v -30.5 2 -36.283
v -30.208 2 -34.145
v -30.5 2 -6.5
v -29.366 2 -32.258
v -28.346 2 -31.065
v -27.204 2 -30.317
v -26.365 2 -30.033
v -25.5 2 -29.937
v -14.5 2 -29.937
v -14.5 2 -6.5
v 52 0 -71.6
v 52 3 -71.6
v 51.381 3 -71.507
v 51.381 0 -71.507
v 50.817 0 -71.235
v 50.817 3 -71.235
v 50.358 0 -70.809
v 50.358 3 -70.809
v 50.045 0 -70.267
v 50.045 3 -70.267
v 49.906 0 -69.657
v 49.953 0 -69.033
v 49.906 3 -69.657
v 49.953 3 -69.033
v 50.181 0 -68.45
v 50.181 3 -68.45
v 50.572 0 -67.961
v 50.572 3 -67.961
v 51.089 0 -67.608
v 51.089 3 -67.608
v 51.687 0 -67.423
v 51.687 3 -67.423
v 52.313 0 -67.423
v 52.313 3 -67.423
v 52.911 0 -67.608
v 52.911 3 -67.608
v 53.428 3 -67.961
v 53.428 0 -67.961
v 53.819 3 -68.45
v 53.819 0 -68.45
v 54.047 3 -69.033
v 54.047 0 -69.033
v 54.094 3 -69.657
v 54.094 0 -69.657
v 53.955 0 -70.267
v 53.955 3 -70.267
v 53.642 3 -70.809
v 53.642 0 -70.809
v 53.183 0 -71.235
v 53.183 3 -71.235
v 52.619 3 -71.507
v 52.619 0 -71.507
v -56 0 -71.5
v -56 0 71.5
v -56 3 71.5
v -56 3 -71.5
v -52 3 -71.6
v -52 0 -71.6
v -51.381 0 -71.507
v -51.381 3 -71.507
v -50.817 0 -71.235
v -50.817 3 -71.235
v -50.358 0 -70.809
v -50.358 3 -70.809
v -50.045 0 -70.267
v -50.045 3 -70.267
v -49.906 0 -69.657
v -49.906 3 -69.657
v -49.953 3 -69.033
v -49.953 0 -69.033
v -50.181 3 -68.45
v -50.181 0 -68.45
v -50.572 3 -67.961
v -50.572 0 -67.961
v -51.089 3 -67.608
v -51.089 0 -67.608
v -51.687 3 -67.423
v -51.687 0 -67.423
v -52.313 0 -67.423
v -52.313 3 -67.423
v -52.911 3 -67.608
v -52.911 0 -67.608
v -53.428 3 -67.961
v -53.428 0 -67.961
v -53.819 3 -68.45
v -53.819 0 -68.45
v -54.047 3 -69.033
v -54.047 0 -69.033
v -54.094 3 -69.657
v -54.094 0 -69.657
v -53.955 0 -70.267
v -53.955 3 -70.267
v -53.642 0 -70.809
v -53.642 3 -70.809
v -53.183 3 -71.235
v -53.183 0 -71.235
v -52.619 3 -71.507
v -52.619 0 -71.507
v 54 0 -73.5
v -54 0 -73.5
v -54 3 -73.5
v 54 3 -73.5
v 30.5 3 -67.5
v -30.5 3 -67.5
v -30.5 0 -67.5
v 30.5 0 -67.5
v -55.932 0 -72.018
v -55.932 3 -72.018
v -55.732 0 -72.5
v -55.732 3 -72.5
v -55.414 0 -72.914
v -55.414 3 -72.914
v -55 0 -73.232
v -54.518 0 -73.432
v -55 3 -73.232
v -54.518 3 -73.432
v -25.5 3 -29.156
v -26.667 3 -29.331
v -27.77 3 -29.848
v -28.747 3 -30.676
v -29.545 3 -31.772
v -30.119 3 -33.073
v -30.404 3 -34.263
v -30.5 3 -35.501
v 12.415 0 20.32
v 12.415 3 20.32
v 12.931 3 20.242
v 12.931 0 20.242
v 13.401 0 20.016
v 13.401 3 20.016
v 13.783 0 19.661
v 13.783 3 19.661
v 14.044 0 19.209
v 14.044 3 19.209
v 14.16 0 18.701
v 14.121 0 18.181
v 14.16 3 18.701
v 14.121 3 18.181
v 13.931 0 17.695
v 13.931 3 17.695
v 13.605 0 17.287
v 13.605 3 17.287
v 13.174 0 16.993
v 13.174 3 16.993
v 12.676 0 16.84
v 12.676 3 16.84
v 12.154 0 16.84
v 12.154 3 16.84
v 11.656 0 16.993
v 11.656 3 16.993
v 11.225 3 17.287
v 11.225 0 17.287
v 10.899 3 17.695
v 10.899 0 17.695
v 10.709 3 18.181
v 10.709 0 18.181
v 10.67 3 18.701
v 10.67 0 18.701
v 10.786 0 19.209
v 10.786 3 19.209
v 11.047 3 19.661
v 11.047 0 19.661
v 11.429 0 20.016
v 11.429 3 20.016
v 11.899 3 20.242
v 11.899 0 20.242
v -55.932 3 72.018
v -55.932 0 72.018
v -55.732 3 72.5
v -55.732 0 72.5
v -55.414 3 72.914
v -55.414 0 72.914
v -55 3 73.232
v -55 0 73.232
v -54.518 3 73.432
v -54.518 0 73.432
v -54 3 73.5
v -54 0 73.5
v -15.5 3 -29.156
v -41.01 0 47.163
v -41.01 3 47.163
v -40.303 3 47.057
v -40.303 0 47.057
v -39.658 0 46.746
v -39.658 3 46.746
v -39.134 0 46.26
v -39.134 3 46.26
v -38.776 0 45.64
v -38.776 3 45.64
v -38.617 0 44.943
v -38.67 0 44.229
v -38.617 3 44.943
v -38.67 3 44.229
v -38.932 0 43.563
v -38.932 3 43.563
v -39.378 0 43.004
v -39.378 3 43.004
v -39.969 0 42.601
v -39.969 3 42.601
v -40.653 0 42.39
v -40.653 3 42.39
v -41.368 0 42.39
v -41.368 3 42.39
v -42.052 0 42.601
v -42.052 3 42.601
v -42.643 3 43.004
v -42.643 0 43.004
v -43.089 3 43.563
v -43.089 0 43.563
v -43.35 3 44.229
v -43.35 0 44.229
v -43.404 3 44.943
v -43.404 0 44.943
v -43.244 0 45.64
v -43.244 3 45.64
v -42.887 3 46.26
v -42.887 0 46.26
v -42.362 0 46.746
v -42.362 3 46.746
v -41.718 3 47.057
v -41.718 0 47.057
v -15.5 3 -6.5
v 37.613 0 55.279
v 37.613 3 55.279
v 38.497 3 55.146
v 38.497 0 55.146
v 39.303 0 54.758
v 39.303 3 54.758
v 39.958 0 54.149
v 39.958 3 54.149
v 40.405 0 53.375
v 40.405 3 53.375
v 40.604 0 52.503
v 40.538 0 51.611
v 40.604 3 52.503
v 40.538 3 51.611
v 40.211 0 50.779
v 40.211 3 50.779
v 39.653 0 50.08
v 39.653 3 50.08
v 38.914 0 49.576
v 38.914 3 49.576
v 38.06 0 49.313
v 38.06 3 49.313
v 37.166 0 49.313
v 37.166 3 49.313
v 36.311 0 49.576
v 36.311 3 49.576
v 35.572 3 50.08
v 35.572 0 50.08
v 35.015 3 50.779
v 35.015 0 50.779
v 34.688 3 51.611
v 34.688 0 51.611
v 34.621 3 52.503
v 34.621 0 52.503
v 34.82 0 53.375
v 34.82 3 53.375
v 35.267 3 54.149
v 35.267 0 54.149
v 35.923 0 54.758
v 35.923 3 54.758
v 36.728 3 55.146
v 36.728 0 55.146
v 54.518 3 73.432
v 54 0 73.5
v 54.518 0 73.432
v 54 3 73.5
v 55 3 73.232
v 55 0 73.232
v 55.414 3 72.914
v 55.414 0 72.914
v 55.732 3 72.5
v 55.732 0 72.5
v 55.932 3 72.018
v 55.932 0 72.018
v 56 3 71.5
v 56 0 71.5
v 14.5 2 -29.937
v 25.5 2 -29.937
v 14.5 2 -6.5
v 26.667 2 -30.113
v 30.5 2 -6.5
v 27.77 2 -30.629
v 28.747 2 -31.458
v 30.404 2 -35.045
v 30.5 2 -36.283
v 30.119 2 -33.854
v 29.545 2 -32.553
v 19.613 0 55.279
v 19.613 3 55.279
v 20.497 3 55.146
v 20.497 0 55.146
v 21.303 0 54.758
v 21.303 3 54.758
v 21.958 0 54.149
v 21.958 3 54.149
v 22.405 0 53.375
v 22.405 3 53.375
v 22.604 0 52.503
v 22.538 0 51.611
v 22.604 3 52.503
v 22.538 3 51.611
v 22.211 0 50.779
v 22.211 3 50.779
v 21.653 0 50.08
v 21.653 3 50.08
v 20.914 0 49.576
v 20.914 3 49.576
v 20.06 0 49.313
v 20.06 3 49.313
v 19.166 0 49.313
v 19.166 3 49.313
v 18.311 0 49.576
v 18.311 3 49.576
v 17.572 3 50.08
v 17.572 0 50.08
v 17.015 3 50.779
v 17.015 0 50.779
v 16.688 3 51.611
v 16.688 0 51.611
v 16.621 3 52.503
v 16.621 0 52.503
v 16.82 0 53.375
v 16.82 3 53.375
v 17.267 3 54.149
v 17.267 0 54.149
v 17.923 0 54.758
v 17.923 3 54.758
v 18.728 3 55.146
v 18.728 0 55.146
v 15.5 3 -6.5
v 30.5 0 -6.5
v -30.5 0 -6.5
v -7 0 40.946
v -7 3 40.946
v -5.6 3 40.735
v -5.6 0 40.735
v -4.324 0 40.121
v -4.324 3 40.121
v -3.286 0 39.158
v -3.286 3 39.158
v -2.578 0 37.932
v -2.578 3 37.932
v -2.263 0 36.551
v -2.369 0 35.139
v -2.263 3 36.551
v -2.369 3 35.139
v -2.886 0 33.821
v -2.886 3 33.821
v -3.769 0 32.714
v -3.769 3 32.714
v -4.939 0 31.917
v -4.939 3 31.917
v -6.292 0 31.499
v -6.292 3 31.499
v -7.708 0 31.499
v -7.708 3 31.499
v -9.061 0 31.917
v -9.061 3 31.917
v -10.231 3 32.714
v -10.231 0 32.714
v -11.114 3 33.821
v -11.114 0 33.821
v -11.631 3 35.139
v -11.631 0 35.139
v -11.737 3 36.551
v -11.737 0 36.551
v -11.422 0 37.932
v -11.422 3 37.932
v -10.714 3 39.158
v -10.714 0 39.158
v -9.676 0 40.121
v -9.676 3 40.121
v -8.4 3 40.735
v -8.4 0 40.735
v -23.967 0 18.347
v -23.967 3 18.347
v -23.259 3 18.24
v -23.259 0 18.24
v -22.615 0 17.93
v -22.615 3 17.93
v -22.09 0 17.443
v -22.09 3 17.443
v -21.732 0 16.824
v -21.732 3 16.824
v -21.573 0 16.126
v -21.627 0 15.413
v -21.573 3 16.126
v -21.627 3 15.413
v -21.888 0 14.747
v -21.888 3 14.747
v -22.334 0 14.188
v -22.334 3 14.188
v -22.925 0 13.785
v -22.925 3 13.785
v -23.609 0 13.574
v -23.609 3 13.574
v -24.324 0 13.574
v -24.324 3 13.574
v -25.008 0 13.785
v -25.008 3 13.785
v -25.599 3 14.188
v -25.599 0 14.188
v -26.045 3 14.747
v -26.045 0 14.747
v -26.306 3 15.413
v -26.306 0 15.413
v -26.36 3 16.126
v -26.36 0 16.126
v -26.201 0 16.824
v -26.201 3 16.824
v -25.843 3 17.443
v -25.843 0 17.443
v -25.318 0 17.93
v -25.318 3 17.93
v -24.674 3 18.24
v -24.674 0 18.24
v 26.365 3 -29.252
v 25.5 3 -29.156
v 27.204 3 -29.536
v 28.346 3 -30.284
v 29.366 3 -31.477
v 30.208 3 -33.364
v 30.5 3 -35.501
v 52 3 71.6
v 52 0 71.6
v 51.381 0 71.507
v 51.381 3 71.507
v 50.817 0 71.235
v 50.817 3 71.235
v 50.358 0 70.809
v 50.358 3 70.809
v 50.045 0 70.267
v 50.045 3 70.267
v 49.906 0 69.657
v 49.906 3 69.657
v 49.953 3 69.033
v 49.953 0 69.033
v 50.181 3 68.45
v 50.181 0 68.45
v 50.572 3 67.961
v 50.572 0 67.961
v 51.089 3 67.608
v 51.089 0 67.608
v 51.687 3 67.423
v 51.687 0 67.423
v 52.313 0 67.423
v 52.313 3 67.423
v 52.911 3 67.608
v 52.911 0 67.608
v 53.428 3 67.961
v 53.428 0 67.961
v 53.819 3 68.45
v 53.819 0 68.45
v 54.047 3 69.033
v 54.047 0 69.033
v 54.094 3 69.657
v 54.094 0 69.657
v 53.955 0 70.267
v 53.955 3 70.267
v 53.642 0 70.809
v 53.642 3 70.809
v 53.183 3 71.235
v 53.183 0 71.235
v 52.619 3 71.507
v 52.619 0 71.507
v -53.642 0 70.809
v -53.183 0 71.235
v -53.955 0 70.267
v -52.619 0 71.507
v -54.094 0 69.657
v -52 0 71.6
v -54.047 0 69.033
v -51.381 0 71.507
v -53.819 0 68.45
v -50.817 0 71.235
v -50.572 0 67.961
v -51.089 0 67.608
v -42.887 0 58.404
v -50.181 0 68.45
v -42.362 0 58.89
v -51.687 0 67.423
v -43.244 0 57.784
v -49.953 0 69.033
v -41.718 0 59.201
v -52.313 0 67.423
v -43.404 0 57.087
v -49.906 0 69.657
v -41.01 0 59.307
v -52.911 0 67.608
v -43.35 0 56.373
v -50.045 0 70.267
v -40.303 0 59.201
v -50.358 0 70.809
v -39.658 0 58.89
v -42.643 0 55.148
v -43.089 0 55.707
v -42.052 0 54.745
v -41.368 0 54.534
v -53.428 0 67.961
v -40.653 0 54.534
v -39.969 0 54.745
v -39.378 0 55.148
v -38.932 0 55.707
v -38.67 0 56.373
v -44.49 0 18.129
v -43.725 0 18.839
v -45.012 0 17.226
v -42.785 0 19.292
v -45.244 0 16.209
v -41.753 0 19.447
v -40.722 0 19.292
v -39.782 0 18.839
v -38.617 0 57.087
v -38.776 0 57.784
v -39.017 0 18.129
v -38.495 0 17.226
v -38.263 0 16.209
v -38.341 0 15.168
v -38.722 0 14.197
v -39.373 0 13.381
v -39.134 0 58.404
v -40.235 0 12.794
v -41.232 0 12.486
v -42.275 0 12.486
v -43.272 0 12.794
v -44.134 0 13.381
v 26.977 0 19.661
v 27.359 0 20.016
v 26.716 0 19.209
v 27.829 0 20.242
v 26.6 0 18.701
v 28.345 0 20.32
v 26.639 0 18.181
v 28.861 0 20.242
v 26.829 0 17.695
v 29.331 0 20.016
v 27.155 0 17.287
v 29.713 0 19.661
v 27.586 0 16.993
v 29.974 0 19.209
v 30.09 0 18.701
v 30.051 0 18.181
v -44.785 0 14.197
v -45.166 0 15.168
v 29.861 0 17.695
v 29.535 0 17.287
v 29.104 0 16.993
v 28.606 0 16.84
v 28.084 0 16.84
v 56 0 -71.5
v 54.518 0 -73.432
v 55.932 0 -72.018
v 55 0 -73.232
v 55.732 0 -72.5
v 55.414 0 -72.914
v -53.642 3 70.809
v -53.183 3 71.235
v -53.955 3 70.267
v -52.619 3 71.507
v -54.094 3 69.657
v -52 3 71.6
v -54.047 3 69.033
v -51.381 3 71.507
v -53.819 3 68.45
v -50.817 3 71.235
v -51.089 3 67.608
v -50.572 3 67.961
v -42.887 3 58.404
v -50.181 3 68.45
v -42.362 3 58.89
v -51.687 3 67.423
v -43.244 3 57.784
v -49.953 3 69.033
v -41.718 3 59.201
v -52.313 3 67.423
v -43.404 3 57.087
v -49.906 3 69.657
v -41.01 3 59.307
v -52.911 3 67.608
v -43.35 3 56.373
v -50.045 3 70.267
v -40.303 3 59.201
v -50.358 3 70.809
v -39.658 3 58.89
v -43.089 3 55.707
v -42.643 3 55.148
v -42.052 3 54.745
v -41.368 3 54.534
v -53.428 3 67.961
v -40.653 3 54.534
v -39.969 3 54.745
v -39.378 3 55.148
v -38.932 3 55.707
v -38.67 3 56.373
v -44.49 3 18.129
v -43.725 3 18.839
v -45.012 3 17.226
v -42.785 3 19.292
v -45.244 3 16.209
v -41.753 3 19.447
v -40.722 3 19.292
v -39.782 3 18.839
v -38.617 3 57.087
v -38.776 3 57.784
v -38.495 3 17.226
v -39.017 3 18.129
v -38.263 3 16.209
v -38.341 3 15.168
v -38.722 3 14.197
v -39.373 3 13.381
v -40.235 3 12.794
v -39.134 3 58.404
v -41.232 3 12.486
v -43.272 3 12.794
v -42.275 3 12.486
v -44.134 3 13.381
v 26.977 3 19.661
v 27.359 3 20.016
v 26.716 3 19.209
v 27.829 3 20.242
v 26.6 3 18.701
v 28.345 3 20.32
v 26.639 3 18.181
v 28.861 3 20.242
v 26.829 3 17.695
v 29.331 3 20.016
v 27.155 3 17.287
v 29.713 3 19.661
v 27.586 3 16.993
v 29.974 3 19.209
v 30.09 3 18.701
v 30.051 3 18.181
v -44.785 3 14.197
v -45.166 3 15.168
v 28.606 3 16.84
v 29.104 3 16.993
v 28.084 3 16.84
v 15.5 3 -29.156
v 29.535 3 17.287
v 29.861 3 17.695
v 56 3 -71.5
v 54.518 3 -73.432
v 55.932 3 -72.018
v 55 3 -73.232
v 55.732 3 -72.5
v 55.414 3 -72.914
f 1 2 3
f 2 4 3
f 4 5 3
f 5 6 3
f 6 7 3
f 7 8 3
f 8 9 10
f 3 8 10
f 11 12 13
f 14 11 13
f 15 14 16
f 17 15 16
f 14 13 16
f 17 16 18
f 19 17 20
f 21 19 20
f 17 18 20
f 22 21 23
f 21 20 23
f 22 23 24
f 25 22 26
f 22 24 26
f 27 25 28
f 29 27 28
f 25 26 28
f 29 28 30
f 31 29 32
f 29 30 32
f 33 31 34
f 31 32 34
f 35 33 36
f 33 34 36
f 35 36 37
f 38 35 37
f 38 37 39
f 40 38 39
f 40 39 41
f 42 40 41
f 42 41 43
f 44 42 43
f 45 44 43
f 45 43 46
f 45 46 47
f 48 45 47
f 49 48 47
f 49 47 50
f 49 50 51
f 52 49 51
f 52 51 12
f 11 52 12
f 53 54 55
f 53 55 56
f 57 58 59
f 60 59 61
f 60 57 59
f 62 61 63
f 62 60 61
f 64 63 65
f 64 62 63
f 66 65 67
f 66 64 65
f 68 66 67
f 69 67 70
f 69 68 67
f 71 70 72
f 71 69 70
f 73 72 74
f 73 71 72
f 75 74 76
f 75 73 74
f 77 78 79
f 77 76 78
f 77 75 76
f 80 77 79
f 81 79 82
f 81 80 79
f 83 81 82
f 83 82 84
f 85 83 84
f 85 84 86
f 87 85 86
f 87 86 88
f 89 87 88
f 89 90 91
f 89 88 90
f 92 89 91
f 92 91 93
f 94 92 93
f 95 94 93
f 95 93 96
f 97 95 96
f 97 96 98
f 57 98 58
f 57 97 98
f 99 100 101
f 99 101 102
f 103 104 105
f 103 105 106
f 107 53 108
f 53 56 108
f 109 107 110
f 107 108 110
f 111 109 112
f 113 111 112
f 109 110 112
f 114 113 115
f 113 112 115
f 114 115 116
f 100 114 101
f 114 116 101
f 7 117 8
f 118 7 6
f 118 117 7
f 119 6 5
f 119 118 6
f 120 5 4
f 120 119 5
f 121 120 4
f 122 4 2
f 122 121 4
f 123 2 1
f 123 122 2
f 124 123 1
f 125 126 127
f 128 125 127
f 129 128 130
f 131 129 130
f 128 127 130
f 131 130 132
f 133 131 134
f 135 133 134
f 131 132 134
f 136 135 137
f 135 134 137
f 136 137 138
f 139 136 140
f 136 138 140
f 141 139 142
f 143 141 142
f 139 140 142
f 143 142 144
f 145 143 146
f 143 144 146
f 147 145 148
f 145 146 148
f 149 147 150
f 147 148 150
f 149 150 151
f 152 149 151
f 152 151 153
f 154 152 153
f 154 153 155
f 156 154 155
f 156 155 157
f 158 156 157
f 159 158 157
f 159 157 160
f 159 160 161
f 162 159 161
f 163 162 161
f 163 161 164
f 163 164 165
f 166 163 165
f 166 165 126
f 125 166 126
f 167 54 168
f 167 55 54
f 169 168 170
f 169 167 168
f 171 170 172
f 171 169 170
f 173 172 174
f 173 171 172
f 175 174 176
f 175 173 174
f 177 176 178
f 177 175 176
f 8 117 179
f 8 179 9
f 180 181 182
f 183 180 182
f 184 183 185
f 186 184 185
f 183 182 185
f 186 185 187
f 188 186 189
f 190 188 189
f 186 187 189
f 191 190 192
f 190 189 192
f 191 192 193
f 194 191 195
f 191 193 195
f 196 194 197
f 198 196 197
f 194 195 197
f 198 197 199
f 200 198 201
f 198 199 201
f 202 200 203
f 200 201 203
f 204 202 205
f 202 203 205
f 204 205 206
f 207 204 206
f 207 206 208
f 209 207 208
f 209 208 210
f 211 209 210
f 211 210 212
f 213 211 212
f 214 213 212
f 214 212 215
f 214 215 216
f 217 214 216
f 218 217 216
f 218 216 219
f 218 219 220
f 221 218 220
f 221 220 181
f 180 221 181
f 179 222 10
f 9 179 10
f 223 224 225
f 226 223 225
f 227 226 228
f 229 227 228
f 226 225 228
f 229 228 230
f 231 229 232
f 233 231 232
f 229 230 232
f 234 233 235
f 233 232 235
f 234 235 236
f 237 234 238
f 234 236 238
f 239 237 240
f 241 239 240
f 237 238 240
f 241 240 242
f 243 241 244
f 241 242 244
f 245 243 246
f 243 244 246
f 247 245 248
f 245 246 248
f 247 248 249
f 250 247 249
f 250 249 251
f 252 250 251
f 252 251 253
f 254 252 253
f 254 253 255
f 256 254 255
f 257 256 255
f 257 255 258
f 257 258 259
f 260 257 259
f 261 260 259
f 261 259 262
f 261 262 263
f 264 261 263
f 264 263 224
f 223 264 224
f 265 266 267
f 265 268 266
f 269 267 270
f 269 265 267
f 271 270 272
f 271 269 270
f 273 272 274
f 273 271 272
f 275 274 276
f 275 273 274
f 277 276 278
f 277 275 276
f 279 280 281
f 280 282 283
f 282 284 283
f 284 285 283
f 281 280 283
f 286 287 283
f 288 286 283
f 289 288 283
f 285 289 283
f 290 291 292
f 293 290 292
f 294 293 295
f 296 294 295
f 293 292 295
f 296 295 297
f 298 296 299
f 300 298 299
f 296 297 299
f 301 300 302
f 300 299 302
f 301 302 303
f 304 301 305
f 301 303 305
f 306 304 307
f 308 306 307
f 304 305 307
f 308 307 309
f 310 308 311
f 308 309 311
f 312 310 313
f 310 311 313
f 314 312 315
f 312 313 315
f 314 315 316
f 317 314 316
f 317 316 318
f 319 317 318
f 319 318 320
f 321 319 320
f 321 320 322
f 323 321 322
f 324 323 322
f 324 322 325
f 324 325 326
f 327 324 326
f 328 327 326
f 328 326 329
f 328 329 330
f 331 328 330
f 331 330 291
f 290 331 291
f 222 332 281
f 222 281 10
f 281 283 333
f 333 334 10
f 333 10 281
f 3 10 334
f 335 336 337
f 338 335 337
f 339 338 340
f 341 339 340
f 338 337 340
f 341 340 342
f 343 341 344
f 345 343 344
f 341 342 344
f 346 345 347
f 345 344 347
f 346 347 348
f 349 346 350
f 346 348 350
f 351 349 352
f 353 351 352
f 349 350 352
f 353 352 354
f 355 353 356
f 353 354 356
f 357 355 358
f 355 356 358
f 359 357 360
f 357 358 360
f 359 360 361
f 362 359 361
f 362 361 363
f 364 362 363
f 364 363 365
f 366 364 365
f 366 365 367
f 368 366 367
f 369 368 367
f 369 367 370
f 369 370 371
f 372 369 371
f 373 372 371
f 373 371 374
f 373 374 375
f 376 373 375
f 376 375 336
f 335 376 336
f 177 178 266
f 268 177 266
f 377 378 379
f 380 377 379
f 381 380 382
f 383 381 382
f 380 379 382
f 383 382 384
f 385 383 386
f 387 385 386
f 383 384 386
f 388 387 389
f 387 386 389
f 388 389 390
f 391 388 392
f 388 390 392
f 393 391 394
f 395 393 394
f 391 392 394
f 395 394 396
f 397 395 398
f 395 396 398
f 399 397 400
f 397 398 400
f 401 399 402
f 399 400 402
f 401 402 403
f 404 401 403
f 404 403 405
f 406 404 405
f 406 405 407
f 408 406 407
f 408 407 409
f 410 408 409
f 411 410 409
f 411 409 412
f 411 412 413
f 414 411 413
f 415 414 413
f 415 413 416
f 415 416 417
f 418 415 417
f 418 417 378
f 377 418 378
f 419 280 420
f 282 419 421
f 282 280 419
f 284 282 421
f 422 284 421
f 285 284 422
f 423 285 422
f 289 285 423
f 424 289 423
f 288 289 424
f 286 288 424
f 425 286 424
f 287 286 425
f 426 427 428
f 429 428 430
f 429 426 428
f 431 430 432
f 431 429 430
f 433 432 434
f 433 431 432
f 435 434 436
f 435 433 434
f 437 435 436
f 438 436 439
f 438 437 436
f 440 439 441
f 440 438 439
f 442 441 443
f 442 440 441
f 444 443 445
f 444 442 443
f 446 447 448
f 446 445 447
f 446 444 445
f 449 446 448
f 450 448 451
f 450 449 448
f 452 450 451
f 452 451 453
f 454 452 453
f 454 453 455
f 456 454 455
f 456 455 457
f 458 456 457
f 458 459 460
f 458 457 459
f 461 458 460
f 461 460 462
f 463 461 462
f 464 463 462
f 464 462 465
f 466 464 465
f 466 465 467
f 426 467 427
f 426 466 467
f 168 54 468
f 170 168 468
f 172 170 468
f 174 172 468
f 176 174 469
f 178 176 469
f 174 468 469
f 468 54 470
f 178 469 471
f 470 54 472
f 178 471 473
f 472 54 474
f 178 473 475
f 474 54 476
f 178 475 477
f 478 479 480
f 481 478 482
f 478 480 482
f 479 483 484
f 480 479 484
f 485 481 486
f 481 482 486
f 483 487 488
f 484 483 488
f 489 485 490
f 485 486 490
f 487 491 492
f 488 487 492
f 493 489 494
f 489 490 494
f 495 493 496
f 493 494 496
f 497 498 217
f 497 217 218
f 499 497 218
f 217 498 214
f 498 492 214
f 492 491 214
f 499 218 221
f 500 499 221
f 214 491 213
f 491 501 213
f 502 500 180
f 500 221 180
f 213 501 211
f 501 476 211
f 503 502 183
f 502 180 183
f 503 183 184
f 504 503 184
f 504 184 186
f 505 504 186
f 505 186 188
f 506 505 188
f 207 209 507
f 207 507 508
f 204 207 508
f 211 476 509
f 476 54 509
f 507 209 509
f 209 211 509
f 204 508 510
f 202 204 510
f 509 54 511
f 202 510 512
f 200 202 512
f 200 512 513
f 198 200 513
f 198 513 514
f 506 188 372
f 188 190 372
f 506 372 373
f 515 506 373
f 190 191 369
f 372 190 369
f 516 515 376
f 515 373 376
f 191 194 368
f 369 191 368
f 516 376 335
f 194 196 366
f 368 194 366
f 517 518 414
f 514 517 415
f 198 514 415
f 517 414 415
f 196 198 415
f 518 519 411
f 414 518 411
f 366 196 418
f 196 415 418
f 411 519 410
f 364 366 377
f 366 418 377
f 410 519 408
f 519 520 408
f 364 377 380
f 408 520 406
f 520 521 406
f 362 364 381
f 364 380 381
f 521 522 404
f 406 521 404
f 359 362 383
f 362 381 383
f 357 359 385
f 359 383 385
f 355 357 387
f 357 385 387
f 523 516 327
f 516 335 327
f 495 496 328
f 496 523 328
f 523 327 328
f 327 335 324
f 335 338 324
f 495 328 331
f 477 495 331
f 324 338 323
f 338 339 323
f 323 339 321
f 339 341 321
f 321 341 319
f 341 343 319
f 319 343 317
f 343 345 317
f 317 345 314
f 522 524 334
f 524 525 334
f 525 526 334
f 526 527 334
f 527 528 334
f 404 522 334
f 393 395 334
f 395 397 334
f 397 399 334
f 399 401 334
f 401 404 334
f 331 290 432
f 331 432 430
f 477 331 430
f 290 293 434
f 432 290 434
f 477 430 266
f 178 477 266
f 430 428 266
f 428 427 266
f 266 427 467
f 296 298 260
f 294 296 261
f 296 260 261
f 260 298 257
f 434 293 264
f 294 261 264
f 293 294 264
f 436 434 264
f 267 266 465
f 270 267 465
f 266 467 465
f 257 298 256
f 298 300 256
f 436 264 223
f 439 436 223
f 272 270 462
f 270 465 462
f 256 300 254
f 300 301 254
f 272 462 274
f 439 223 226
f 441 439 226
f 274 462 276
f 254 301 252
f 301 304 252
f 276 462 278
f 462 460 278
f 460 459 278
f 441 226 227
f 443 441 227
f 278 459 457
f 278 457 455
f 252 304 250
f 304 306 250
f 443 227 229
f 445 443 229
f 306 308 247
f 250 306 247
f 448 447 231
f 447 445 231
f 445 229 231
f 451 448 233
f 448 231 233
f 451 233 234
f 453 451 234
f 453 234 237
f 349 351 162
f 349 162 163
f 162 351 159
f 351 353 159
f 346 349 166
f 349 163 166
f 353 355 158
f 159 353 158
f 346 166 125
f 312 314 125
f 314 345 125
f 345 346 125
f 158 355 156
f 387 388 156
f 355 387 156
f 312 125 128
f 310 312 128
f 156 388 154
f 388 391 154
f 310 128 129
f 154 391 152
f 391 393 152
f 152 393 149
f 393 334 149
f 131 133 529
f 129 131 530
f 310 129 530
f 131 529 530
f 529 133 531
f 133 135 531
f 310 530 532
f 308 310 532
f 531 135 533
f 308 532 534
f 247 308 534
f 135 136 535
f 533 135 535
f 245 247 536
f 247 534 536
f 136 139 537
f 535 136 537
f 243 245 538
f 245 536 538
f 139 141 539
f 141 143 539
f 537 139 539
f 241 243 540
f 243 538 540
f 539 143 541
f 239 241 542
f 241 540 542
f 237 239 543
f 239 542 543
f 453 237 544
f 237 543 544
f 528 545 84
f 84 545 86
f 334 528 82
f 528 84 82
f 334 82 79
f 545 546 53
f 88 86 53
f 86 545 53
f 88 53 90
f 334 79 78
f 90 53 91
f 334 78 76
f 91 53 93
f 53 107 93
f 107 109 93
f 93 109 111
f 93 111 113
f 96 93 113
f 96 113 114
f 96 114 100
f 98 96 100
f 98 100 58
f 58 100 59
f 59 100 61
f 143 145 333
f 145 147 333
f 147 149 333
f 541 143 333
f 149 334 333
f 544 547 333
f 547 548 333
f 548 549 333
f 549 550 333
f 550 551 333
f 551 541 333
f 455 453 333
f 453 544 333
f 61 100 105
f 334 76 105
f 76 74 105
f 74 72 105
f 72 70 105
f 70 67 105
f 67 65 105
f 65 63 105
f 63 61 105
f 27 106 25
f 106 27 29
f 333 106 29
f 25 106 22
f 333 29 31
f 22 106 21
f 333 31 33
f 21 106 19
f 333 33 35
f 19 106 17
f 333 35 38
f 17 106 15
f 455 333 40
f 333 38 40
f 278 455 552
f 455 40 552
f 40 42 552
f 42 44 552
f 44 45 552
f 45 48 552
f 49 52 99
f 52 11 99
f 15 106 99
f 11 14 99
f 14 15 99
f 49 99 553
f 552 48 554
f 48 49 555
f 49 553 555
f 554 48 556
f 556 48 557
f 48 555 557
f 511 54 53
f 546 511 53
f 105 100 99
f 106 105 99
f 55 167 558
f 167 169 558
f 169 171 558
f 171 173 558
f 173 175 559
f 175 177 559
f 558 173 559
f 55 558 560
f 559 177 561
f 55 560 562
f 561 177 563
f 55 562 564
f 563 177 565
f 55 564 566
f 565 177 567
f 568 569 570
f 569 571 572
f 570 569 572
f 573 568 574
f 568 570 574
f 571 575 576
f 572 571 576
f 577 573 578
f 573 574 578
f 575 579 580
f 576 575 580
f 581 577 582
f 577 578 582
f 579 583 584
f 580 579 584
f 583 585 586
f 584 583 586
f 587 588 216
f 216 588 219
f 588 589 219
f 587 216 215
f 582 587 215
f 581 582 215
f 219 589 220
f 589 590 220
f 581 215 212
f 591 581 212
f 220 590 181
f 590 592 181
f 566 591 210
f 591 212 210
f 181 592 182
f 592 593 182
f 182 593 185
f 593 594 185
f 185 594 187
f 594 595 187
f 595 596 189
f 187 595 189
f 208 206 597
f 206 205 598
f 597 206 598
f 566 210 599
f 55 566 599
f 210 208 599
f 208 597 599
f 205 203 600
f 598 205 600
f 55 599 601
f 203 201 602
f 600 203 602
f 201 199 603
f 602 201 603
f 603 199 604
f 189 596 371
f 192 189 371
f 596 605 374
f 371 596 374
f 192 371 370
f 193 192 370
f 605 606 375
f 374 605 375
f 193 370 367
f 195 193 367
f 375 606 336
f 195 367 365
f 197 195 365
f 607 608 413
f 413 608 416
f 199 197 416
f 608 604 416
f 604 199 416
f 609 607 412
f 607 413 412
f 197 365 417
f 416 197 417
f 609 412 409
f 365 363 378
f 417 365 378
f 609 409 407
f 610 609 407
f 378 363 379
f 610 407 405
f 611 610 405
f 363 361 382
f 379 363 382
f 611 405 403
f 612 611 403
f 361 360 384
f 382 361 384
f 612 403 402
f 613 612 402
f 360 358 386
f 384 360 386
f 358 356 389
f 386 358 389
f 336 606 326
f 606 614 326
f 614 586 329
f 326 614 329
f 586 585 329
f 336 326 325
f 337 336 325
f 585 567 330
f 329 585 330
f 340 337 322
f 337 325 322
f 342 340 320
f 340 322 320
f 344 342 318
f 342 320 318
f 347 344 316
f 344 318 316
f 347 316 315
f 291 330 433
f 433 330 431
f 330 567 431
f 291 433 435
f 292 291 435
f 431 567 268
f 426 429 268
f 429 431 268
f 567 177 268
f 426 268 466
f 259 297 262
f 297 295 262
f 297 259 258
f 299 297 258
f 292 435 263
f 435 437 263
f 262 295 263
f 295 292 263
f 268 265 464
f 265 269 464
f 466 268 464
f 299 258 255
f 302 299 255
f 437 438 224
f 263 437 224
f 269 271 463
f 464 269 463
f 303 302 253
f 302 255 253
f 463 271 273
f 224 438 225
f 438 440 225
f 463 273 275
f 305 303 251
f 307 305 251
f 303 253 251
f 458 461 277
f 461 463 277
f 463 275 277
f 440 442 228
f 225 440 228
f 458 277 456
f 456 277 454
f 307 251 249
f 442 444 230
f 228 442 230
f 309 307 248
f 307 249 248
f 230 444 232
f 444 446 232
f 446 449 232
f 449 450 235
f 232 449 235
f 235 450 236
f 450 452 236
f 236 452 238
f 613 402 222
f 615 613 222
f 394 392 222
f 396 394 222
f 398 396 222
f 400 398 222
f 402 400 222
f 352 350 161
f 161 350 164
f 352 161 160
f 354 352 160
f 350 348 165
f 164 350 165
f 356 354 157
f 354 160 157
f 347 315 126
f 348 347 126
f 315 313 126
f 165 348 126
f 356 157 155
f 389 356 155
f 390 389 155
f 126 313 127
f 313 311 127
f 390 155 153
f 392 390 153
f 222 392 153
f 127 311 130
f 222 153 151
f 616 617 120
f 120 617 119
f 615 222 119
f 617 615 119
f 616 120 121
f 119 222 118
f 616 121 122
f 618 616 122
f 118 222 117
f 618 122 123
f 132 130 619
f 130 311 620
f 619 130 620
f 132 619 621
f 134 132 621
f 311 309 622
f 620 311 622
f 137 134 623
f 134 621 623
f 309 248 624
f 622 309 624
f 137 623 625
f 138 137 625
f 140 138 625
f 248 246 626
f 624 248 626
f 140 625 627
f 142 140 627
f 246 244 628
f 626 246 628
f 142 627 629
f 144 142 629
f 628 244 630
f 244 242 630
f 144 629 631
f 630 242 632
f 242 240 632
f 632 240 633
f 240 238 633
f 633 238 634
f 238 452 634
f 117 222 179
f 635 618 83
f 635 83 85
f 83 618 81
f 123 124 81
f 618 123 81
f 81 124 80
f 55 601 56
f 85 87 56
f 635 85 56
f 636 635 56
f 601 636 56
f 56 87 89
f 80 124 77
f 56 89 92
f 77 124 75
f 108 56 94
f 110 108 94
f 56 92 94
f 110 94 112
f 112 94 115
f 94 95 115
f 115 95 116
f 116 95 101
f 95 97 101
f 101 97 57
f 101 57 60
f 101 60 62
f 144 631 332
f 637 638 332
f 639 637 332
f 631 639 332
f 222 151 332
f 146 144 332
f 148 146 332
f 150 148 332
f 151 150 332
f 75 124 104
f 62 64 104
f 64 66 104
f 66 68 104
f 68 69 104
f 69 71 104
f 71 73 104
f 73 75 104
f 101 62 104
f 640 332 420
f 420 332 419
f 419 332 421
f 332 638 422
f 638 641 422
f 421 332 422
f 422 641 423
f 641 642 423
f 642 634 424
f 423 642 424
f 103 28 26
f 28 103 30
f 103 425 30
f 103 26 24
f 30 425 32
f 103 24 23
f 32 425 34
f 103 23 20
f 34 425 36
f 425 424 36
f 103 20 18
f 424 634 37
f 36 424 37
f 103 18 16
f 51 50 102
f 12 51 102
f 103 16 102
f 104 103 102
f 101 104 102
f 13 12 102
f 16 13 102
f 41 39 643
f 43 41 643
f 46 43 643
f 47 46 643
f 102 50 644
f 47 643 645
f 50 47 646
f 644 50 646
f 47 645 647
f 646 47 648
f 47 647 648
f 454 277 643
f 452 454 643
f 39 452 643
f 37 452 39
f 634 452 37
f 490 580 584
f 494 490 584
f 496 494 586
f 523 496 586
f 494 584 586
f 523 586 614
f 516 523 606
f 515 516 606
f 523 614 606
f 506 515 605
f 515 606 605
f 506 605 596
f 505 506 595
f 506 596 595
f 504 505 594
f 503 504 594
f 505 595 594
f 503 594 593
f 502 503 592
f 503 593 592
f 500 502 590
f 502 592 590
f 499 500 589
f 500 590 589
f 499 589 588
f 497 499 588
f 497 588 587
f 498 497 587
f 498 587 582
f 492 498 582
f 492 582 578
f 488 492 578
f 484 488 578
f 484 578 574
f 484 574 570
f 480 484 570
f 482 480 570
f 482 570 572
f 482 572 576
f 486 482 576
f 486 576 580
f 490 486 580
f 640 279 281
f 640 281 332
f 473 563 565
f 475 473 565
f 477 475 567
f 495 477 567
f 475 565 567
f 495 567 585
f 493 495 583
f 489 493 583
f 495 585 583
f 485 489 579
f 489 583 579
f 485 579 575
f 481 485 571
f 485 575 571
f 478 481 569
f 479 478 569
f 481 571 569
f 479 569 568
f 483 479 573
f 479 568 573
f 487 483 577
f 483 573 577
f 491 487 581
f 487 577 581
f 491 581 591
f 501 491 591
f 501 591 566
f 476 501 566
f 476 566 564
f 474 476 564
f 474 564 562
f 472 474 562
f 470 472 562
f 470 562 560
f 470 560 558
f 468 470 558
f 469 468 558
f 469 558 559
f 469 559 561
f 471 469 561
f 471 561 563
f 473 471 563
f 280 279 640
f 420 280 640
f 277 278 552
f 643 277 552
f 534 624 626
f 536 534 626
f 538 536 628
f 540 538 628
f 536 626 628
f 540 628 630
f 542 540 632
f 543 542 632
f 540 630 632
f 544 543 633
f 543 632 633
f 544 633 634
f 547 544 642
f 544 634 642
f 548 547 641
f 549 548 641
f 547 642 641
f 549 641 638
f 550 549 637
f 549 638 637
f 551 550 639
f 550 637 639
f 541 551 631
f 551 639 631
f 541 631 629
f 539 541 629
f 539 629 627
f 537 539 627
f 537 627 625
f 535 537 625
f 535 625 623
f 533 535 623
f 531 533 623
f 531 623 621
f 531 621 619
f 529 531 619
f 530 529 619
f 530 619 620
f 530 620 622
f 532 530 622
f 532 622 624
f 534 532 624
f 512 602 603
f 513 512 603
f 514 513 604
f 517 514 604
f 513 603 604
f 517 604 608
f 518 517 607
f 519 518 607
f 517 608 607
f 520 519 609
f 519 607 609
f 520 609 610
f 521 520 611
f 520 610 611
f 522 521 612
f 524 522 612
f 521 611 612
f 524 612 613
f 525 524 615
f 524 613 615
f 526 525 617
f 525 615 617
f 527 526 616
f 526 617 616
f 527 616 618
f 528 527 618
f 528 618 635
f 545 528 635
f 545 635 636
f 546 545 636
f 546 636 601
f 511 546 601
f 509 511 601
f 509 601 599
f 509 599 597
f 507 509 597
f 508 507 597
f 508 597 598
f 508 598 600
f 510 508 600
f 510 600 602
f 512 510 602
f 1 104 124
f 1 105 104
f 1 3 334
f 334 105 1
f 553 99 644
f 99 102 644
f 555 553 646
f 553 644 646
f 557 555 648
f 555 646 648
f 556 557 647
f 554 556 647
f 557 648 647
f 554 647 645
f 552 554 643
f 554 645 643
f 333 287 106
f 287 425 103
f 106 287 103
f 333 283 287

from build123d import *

# Parameters (mm, degrees)
SKETCH1_W               = 112
SKETCH1_H               = 147
BOSS_EXTRUDE1_DEPTH     = 3
SKETCH2_W               = 61
SKETCH2_H               = 61
BOSS_EXTRUDE2_DEPTH     = 3
SKETCH2_2_W             = 61
SKETCH2_2_H             = 61
CUT_EXTRUDE1_DEPTH      = 93.451338552
SKETCH3_R               = 1.75
SKETCH3_R_2             = 2.4
SKETCH3_R_3             = 4.75
SKETCH3_R_4             = 3
SKETCH3_R_5             = 3.5
CUT_EXTRUDE2_DEPTH      = 10
SKETCH4_R               = 2.1
CUT_EXTRUDE3_DEPTH      = 5
MIRROR2_COPY_1_SKETCH_R = 2.1
MIRROR2_COPY_1_DEPTH    = 5
FILLET1_R               = 2
SKETCH5_W               = 37.020085877
SKETCH5_H               = 31.91839976
BOSS_EXTRUDE4_DEPTH     = 1
CHAMFER4_SIZE           = 2.34385688
CHAMFER4_SIZE_2         = 3
MIRROR9_START           = 14.5
MIRROR9_DEPTH           = 16
MIRROR9_START_2         = 7
MIRROR9_2_DEPTH         = 1.838834765
FILLET2_R               = 5


with BuildPart() as part:
    # Sketch1 → Boss-Extrude1 (new body)
    with BuildSketch(Plane(origin=(0, 0, 0), x_dir=(1, 0, 0), z_dir=(0, 1, 0))):
        Rectangle(SKETCH1_W, SKETCH1_H)
    extrude(amount=BOSS_EXTRUDE1_DEPTH)

    # Sketch2 → Boss-Extrude2 (add)
    with BuildSketch(Plane(origin=(0, 3, 0), x_dir=(1, 0, 0), z_dir=(0, 1, 0))):
        with Locations((0, 37)):
            Rectangle(SKETCH2_W, SKETCH2_H)
    extrude(amount=-BOSS_EXTRUDE2_DEPTH)

    # Sketch2<2> → Cut-Extrude1 (cut, through all)
    with BuildSketch(Plane(origin=(0, 3, 0), x_dir=(1, 0, 0), z_dir=(0, 1, 0))):
        with Locations((0, 37)):
            Rectangle(SKETCH2_2_W, SKETCH2_2_H)
    extrude(amount=-CUT_EXTRUDE1_DEPTH, mode=Mode.SUBTRACT)

    # Sketch3 → Cut-Extrude2 (cut)
    with BuildSketch(Plane(origin=(0, 3, 0), x_dir=(1, 0, 0), z_dir=(0, 1, 0))):
        with Locations(Location((12.415, -18.57, 0), (0, 0, 270))):
            Circle(SKETCH3_R)
        with Locations(Location((28.345, -18.57, 0), (0, 0, 270))):
            Circle(SKETCH3_R)
        with Locations(Location((-41.010240817, -44.763305049, 0), (0, 0, 270))):
            Circle(SKETCH3_R_2)
        with Locations(Location((-41.010240817, -56.907347776, 0), (0, 0, 270))):
            Circle(SKETCH3_R_2)
        with Locations(Location((-23.966529419, -15.947077361, 0), (0, 0, 270))):
            Circle(SKETCH3_R_2)
        with Locations(Location((-7, -36.196378326, 0), (0, 0, 270))):
            Circle(SKETCH3_R_3)
        with Locations(Location((19.612753758, -52.279000863, 0), (0, 0, 270))):
            Circle(SKETCH3_R_4)
        with Locations(Location((37.612753758, -52.279000863, 0), (0, 0, 270))):
            Circle(SKETCH3_R_4)
        with Locations(Location((-41.753496243, -15.947077361, 0), (0, 0, 270))):
            Circle(SKETCH3_R_5)
    extrude(amount=-CUT_EXTRUDE2_DEPTH, mode=Mode.SUBTRACT)

    # Sketch4 → Cut-Extrude3 (cut)
    with BuildSketch(Plane(origin=(0, 3, 0), x_dir=(1, 0, 0), z_dir=(0, 1, 0))):
        with Locations(Location((-52, -69.5, 0), (0, 0, 270))):
            Circle(SKETCH4_R)
    cut_extrude3 = extrude(amount=-CUT_EXTRUDE3_DEPTH, mode=Mode.SUBTRACT)

    # Mirror1: Cut-Extrude3 across plane
    add(cut_extrude3.mirror(Plane(origin=(0, 0, 0), x_dir=(0, 0, 1), z_dir=(1, 0, 0))), mode=Mode.SUBTRACT)

    # Mirror2: Cut-Extrude3 across plane
    add(cut_extrude3.mirror(Plane.XY), mode=Mode.SUBTRACT)

    # Mirror2 copy 1 sketch → Mirror2 copy 1 (cut)
    with BuildSketch(Plane(origin=(0, 3, 0), x_dir=(-1, 0, 0), z_dir=(0, 1, 0))):
        with Locations(Location((-52, -69.5, 0), (0, 0, 270))):
            Circle(MIRROR2_COPY_1_SKETCH_R)
    extrude(amount=-MIRROR2_COPY_1_DEPTH, mode=Mode.SUBTRACT)

    # Fillet1
    fillet1_edges = [part.edges().sort_by_distance(p)[0] for p in [
        (56, 1.5, 73.5),
        (-56, 1.5, 73.5),
        (-56, 1.5, -73.5),
        (56, 1.5, -73.5),
    ]]
    fillet(fillet1_edges, radius=FILLET1_R)

    # Sketch5 → Boss-Extrude4 (add)
    with BuildSketch(Plane(origin=(0, 2, 0), x_dir=(1, 0, 0), z_dir=(0, 1, 0))):
        with Locations((-29.010042938, 15.54080012)):
            Rectangle(SKETCH5_W, SKETCH5_H)
    extrude(amount=BOSS_EXTRUDE4_DEPTH)

    # Chamfer1
    # the kernel refuses this chamfer: 5 mm, written as the material it takes off along each edge
    with BuildSketch(Plane(origin=(-10.5, 3, -44.35841494), x_dir=(-1, 0, 0), z_dir=(0, 0, 1))) as chamfer1_piece_1:
        with BuildLine():
            Line((5.141421356, -0.141421356), (-0.141421356, 5.141421356))
            Line((-0.141421356, 5.141421356), (-0.241421356, 5.141421356))
            ThreePointArc((-0.241421356, 5.141421356), (-0.1, 2.570710678), (-0.1, 0))
            Line((-0.1, 0), (0, -0.1))
            ThreePointArc((0, -0.1), (2.570710678, -0.1), (5.141421356, -0.241421356))
            Line((5.141421356, -0.241421356), (5.141421356, -0.141421356))
        make_face()
    extrude(amount=37.85841494, mode=Mode.SUBTRACT)

    # Chamfer4
    # the kernel refuses this chamfer: 3, 2.34385688 mm, written as the material it takes off along each edge
    with BuildSketch(Plane(origin=(-30.5, 3, -31.5), x_dir=(0, 0, 1), z_dir=(1, 0, 0))) as chamfer4_piece_1:
        Polygon((CHAMFER4_SIZE, 0), (0, CHAMFER4_SIZE_2), (0, 0), align=None)
    extrude(amount=22.738607652, mode=Mode.SUBTRACT)

    # Mirror9: read off the stored shape, not the designer's step
    # Mirror9 outline → Mirror9 (add)
    with BuildSketch(Plane.YZ.offset(MIRROR9_START)):
        Polygon((2, -29.937428747), (3, -29.15614312), (3, -6.5), (2, -6.5), align=None)
    extrude(amount=MIRROR9_DEPTH)

    # Mirror9 2 outline → Mirror9 2 (cut)
    with BuildSketch(Plane(origin=(0, 0, 0), x_dir=(0.7071067811865509, 0.707106781186544, 0), z_dir=(0.707106781186544, -0.707106781186551, 0)).offset(MIRROR9_START_2)):
        Polygon((13.081475452, -29.15614312), (13.081475452, -6.5), (11.66726189, -6.5), (11.66726189, -29.937428747), align=None)
    extrude(amount=MIRROR9_2_DEPTH, mode=Mode.SUBTRACT)

    # Fillet2
    # the kernel refuses this fillet: 5 mm, written as the material it adds along each edge
    with BuildSketch(Plane(origin=(-30.5, 12.850134419, -21.460374677), x_dir=(1, 0, 0), z_dir=(0, -0.788010753545573, -0.6156614754039254))) as fillet2_piece_1_section:
        with BuildLine():
            CenterArc((FILLET2_R, -FILLET2_R), FILLET2_R, 90, 90)
            Line((0, -FILLET2_R), (0, 0))
            Line((0, 0), (FILLET2_R, 0))
        make_face()
    fillet2_piece_1 = extrude(amount=26.269018215, mode=Mode.PRIVATE)
    fillet2_piece_1 = split(fillet2_piece_1, bisect_by=Plane(origin=(-30.5, 3, -21.460374677), z_dir=(0, -1, 0)), keep=Keep.TOP, mode=Mode.PRIVATE)
    fillet2_piece_1 = split(fillet2_piece_1, bisect_by=Plane(origin=(-30.5, 2, -21.460374677), z_dir=(0, 1, 0)), keep=Keep.TOP, mode=Mode.PRIVATE)
    add(fillet2_piece_1)
    with BuildSketch(Plane(origin=(30.5, -7.850134418, -37.633197192), x_dir=(0, 0.6156614755670328, -0.7880107534181395), z_dir=(0, 0.7880107534181395, 0.6156614755670328))) as fillet2_piece_2_section:
        with BuildLine():
            CenterArc((FILLET2_R, FILLET2_R), FILLET2_R, 180, 90)
            Line((0, FILLET2_R), (0, 0))
            Line((0, 0), (FILLET2_R, 0))
        make_face()
    fillet2_piece_2 = extrude(amount=26.269018215, mode=Mode.PRIVATE)
    fillet2_piece_2 = split(fillet2_piece_2, bisect_by=Plane(origin=(30.5, 3, -37.633197192), z_dir=(0, -1, 0)), keep=Keep.TOP, mode=Mode.PRIVATE)
    fillet2_piece_2 = split(fillet2_piece_2, bisect_by=Plane(origin=(30.5, 2, -37.633197192), z_dir=(0, 1, 0)), keep=Keep.TOP, mode=Mode.PRIVATE)
    add(fillet2_piece_2)


solid = part.part
